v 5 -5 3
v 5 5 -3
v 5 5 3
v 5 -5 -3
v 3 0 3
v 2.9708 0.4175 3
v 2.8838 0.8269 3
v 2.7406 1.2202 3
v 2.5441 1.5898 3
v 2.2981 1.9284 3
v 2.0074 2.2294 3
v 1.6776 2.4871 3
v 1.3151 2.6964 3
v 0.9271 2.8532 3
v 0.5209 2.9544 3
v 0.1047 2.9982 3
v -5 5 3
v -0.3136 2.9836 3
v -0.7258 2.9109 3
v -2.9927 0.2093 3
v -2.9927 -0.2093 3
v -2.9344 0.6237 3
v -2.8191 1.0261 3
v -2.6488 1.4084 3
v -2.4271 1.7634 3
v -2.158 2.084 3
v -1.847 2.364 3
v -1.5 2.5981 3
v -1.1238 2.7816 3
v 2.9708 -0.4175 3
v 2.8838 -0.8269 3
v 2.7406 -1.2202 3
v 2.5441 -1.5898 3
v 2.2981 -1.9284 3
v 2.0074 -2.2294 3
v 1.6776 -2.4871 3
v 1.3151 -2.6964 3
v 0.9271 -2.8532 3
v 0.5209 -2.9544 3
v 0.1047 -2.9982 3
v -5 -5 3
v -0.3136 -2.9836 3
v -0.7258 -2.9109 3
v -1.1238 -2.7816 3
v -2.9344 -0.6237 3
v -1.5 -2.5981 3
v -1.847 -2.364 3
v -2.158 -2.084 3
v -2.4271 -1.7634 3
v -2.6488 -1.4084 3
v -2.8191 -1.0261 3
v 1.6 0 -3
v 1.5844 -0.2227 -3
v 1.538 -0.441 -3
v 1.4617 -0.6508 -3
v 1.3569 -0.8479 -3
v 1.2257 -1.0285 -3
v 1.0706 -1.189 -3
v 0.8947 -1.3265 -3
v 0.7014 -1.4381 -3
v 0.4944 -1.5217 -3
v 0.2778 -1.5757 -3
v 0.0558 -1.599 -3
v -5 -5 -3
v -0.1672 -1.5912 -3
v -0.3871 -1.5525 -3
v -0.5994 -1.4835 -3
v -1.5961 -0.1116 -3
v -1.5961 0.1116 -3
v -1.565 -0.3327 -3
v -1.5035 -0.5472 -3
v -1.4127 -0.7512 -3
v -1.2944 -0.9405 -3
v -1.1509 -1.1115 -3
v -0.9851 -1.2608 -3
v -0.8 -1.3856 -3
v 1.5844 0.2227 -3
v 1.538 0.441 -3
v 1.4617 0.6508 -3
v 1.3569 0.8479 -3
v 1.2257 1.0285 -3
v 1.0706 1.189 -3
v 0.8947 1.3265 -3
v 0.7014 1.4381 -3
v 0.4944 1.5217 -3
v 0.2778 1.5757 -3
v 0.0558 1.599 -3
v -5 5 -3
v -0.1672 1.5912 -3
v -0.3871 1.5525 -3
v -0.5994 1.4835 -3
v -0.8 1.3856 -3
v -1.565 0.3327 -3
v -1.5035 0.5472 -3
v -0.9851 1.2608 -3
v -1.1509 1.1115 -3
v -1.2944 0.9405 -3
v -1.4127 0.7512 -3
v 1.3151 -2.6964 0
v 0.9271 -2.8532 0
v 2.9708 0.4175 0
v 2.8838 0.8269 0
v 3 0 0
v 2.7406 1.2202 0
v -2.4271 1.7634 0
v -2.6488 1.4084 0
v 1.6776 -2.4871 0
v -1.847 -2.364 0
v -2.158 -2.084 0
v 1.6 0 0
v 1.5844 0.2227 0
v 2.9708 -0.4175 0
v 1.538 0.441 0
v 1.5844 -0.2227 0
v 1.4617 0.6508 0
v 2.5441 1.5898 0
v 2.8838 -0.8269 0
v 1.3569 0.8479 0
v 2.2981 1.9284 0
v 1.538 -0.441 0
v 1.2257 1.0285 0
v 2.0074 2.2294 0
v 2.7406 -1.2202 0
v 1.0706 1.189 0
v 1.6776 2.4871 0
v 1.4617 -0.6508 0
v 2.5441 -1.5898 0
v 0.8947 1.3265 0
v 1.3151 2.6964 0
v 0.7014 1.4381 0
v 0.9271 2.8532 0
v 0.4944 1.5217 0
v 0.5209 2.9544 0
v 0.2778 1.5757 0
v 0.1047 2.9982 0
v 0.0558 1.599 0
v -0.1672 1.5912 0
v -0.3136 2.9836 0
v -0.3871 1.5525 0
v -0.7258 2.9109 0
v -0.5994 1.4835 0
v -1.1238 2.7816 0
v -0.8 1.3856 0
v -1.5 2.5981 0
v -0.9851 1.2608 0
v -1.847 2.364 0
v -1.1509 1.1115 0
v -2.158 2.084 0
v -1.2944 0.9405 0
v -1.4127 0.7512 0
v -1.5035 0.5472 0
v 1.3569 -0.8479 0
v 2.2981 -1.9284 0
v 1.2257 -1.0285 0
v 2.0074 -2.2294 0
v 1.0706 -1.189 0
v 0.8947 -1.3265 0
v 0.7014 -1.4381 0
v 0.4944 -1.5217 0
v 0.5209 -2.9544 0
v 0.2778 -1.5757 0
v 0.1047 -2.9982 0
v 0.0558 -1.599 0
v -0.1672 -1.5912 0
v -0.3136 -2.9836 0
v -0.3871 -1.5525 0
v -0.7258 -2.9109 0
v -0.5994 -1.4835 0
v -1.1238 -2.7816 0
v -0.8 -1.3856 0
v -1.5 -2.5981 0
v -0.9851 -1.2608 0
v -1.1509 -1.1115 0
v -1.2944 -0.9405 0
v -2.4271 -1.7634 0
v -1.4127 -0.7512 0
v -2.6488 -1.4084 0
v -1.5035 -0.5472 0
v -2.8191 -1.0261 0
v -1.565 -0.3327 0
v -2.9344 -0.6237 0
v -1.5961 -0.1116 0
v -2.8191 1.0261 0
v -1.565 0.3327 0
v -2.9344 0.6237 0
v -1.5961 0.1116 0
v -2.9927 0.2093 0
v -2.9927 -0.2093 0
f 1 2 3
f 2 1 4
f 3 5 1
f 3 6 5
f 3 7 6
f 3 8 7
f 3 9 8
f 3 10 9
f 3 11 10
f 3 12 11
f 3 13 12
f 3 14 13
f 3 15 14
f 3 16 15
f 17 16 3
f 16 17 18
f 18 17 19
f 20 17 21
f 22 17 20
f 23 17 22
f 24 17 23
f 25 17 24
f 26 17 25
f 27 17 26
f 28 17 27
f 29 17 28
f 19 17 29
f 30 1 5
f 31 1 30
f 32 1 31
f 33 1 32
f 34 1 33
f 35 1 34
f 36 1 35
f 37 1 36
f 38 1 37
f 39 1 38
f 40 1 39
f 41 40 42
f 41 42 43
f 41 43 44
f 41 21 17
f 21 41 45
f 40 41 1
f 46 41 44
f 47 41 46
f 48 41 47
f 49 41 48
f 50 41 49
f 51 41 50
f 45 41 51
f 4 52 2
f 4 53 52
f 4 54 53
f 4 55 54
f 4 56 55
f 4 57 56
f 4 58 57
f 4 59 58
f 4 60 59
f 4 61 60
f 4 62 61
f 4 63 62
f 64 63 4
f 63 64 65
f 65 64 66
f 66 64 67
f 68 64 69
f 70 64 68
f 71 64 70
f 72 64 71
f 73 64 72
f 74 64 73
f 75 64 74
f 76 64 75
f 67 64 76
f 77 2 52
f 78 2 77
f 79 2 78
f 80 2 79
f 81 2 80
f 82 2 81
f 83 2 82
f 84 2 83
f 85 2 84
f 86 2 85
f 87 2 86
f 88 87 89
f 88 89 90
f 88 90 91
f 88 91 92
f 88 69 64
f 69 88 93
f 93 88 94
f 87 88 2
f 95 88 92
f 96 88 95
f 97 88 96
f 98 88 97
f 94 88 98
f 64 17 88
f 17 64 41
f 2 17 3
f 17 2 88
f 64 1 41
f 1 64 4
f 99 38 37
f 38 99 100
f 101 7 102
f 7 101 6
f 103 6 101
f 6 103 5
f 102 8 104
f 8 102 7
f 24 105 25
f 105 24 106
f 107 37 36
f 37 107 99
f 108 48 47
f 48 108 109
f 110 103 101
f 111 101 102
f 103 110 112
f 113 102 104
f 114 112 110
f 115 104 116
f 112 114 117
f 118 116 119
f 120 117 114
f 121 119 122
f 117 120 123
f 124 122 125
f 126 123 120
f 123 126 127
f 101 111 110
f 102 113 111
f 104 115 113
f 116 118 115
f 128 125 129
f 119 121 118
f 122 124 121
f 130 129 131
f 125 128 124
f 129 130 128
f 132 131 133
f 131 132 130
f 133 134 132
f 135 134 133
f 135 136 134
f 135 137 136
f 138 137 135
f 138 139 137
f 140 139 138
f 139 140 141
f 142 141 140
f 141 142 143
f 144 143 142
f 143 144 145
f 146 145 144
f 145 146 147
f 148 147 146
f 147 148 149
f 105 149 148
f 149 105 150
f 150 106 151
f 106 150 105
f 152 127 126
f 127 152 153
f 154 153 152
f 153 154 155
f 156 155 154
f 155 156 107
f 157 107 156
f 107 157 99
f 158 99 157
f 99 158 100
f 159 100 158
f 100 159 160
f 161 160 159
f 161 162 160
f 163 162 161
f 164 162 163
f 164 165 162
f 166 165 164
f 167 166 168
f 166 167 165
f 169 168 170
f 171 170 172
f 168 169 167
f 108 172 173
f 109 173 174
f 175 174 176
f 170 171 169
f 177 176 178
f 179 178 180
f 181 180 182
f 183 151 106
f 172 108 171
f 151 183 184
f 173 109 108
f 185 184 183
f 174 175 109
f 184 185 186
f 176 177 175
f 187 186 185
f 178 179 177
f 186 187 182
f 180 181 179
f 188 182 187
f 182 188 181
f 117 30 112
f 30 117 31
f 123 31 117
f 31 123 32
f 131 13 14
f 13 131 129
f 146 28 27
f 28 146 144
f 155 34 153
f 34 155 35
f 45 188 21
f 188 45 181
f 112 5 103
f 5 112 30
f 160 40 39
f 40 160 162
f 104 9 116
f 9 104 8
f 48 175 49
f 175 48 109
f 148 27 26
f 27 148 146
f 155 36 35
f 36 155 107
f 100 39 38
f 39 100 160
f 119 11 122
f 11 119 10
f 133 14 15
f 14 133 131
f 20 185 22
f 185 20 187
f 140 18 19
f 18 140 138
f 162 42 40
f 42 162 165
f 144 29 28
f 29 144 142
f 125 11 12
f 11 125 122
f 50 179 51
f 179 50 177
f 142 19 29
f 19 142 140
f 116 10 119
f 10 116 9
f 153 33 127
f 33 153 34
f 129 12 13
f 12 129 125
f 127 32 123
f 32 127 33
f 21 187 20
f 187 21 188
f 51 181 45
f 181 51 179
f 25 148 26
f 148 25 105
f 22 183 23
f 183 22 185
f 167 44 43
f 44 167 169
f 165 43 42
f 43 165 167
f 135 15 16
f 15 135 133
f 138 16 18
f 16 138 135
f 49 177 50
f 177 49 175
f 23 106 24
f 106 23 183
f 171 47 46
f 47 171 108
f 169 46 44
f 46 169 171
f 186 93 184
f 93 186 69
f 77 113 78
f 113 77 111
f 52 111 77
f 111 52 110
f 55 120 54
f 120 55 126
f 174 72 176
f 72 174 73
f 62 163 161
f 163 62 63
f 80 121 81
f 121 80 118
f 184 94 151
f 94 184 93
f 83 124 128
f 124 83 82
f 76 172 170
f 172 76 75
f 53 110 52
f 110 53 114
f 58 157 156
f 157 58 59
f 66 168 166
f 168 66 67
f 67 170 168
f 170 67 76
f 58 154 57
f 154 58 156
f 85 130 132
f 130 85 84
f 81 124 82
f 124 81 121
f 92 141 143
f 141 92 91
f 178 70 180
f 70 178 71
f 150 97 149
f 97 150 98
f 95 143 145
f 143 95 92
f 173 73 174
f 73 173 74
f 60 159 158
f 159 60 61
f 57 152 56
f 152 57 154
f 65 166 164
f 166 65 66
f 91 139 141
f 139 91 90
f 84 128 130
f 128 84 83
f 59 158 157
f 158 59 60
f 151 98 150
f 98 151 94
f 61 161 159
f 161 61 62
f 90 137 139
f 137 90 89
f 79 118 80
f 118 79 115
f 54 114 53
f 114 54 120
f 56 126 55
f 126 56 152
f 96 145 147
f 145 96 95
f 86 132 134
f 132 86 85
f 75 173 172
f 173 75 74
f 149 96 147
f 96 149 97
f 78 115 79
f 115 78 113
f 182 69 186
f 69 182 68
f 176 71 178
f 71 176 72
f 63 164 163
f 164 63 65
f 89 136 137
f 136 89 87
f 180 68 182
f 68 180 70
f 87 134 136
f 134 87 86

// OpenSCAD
$fn=45;

difference() {
    cube([10,10,6], center=true);
    cylinder(r=3, h=3);
    translate([0,0,-3])
    cylinder(r=1.6, h=10);
}
